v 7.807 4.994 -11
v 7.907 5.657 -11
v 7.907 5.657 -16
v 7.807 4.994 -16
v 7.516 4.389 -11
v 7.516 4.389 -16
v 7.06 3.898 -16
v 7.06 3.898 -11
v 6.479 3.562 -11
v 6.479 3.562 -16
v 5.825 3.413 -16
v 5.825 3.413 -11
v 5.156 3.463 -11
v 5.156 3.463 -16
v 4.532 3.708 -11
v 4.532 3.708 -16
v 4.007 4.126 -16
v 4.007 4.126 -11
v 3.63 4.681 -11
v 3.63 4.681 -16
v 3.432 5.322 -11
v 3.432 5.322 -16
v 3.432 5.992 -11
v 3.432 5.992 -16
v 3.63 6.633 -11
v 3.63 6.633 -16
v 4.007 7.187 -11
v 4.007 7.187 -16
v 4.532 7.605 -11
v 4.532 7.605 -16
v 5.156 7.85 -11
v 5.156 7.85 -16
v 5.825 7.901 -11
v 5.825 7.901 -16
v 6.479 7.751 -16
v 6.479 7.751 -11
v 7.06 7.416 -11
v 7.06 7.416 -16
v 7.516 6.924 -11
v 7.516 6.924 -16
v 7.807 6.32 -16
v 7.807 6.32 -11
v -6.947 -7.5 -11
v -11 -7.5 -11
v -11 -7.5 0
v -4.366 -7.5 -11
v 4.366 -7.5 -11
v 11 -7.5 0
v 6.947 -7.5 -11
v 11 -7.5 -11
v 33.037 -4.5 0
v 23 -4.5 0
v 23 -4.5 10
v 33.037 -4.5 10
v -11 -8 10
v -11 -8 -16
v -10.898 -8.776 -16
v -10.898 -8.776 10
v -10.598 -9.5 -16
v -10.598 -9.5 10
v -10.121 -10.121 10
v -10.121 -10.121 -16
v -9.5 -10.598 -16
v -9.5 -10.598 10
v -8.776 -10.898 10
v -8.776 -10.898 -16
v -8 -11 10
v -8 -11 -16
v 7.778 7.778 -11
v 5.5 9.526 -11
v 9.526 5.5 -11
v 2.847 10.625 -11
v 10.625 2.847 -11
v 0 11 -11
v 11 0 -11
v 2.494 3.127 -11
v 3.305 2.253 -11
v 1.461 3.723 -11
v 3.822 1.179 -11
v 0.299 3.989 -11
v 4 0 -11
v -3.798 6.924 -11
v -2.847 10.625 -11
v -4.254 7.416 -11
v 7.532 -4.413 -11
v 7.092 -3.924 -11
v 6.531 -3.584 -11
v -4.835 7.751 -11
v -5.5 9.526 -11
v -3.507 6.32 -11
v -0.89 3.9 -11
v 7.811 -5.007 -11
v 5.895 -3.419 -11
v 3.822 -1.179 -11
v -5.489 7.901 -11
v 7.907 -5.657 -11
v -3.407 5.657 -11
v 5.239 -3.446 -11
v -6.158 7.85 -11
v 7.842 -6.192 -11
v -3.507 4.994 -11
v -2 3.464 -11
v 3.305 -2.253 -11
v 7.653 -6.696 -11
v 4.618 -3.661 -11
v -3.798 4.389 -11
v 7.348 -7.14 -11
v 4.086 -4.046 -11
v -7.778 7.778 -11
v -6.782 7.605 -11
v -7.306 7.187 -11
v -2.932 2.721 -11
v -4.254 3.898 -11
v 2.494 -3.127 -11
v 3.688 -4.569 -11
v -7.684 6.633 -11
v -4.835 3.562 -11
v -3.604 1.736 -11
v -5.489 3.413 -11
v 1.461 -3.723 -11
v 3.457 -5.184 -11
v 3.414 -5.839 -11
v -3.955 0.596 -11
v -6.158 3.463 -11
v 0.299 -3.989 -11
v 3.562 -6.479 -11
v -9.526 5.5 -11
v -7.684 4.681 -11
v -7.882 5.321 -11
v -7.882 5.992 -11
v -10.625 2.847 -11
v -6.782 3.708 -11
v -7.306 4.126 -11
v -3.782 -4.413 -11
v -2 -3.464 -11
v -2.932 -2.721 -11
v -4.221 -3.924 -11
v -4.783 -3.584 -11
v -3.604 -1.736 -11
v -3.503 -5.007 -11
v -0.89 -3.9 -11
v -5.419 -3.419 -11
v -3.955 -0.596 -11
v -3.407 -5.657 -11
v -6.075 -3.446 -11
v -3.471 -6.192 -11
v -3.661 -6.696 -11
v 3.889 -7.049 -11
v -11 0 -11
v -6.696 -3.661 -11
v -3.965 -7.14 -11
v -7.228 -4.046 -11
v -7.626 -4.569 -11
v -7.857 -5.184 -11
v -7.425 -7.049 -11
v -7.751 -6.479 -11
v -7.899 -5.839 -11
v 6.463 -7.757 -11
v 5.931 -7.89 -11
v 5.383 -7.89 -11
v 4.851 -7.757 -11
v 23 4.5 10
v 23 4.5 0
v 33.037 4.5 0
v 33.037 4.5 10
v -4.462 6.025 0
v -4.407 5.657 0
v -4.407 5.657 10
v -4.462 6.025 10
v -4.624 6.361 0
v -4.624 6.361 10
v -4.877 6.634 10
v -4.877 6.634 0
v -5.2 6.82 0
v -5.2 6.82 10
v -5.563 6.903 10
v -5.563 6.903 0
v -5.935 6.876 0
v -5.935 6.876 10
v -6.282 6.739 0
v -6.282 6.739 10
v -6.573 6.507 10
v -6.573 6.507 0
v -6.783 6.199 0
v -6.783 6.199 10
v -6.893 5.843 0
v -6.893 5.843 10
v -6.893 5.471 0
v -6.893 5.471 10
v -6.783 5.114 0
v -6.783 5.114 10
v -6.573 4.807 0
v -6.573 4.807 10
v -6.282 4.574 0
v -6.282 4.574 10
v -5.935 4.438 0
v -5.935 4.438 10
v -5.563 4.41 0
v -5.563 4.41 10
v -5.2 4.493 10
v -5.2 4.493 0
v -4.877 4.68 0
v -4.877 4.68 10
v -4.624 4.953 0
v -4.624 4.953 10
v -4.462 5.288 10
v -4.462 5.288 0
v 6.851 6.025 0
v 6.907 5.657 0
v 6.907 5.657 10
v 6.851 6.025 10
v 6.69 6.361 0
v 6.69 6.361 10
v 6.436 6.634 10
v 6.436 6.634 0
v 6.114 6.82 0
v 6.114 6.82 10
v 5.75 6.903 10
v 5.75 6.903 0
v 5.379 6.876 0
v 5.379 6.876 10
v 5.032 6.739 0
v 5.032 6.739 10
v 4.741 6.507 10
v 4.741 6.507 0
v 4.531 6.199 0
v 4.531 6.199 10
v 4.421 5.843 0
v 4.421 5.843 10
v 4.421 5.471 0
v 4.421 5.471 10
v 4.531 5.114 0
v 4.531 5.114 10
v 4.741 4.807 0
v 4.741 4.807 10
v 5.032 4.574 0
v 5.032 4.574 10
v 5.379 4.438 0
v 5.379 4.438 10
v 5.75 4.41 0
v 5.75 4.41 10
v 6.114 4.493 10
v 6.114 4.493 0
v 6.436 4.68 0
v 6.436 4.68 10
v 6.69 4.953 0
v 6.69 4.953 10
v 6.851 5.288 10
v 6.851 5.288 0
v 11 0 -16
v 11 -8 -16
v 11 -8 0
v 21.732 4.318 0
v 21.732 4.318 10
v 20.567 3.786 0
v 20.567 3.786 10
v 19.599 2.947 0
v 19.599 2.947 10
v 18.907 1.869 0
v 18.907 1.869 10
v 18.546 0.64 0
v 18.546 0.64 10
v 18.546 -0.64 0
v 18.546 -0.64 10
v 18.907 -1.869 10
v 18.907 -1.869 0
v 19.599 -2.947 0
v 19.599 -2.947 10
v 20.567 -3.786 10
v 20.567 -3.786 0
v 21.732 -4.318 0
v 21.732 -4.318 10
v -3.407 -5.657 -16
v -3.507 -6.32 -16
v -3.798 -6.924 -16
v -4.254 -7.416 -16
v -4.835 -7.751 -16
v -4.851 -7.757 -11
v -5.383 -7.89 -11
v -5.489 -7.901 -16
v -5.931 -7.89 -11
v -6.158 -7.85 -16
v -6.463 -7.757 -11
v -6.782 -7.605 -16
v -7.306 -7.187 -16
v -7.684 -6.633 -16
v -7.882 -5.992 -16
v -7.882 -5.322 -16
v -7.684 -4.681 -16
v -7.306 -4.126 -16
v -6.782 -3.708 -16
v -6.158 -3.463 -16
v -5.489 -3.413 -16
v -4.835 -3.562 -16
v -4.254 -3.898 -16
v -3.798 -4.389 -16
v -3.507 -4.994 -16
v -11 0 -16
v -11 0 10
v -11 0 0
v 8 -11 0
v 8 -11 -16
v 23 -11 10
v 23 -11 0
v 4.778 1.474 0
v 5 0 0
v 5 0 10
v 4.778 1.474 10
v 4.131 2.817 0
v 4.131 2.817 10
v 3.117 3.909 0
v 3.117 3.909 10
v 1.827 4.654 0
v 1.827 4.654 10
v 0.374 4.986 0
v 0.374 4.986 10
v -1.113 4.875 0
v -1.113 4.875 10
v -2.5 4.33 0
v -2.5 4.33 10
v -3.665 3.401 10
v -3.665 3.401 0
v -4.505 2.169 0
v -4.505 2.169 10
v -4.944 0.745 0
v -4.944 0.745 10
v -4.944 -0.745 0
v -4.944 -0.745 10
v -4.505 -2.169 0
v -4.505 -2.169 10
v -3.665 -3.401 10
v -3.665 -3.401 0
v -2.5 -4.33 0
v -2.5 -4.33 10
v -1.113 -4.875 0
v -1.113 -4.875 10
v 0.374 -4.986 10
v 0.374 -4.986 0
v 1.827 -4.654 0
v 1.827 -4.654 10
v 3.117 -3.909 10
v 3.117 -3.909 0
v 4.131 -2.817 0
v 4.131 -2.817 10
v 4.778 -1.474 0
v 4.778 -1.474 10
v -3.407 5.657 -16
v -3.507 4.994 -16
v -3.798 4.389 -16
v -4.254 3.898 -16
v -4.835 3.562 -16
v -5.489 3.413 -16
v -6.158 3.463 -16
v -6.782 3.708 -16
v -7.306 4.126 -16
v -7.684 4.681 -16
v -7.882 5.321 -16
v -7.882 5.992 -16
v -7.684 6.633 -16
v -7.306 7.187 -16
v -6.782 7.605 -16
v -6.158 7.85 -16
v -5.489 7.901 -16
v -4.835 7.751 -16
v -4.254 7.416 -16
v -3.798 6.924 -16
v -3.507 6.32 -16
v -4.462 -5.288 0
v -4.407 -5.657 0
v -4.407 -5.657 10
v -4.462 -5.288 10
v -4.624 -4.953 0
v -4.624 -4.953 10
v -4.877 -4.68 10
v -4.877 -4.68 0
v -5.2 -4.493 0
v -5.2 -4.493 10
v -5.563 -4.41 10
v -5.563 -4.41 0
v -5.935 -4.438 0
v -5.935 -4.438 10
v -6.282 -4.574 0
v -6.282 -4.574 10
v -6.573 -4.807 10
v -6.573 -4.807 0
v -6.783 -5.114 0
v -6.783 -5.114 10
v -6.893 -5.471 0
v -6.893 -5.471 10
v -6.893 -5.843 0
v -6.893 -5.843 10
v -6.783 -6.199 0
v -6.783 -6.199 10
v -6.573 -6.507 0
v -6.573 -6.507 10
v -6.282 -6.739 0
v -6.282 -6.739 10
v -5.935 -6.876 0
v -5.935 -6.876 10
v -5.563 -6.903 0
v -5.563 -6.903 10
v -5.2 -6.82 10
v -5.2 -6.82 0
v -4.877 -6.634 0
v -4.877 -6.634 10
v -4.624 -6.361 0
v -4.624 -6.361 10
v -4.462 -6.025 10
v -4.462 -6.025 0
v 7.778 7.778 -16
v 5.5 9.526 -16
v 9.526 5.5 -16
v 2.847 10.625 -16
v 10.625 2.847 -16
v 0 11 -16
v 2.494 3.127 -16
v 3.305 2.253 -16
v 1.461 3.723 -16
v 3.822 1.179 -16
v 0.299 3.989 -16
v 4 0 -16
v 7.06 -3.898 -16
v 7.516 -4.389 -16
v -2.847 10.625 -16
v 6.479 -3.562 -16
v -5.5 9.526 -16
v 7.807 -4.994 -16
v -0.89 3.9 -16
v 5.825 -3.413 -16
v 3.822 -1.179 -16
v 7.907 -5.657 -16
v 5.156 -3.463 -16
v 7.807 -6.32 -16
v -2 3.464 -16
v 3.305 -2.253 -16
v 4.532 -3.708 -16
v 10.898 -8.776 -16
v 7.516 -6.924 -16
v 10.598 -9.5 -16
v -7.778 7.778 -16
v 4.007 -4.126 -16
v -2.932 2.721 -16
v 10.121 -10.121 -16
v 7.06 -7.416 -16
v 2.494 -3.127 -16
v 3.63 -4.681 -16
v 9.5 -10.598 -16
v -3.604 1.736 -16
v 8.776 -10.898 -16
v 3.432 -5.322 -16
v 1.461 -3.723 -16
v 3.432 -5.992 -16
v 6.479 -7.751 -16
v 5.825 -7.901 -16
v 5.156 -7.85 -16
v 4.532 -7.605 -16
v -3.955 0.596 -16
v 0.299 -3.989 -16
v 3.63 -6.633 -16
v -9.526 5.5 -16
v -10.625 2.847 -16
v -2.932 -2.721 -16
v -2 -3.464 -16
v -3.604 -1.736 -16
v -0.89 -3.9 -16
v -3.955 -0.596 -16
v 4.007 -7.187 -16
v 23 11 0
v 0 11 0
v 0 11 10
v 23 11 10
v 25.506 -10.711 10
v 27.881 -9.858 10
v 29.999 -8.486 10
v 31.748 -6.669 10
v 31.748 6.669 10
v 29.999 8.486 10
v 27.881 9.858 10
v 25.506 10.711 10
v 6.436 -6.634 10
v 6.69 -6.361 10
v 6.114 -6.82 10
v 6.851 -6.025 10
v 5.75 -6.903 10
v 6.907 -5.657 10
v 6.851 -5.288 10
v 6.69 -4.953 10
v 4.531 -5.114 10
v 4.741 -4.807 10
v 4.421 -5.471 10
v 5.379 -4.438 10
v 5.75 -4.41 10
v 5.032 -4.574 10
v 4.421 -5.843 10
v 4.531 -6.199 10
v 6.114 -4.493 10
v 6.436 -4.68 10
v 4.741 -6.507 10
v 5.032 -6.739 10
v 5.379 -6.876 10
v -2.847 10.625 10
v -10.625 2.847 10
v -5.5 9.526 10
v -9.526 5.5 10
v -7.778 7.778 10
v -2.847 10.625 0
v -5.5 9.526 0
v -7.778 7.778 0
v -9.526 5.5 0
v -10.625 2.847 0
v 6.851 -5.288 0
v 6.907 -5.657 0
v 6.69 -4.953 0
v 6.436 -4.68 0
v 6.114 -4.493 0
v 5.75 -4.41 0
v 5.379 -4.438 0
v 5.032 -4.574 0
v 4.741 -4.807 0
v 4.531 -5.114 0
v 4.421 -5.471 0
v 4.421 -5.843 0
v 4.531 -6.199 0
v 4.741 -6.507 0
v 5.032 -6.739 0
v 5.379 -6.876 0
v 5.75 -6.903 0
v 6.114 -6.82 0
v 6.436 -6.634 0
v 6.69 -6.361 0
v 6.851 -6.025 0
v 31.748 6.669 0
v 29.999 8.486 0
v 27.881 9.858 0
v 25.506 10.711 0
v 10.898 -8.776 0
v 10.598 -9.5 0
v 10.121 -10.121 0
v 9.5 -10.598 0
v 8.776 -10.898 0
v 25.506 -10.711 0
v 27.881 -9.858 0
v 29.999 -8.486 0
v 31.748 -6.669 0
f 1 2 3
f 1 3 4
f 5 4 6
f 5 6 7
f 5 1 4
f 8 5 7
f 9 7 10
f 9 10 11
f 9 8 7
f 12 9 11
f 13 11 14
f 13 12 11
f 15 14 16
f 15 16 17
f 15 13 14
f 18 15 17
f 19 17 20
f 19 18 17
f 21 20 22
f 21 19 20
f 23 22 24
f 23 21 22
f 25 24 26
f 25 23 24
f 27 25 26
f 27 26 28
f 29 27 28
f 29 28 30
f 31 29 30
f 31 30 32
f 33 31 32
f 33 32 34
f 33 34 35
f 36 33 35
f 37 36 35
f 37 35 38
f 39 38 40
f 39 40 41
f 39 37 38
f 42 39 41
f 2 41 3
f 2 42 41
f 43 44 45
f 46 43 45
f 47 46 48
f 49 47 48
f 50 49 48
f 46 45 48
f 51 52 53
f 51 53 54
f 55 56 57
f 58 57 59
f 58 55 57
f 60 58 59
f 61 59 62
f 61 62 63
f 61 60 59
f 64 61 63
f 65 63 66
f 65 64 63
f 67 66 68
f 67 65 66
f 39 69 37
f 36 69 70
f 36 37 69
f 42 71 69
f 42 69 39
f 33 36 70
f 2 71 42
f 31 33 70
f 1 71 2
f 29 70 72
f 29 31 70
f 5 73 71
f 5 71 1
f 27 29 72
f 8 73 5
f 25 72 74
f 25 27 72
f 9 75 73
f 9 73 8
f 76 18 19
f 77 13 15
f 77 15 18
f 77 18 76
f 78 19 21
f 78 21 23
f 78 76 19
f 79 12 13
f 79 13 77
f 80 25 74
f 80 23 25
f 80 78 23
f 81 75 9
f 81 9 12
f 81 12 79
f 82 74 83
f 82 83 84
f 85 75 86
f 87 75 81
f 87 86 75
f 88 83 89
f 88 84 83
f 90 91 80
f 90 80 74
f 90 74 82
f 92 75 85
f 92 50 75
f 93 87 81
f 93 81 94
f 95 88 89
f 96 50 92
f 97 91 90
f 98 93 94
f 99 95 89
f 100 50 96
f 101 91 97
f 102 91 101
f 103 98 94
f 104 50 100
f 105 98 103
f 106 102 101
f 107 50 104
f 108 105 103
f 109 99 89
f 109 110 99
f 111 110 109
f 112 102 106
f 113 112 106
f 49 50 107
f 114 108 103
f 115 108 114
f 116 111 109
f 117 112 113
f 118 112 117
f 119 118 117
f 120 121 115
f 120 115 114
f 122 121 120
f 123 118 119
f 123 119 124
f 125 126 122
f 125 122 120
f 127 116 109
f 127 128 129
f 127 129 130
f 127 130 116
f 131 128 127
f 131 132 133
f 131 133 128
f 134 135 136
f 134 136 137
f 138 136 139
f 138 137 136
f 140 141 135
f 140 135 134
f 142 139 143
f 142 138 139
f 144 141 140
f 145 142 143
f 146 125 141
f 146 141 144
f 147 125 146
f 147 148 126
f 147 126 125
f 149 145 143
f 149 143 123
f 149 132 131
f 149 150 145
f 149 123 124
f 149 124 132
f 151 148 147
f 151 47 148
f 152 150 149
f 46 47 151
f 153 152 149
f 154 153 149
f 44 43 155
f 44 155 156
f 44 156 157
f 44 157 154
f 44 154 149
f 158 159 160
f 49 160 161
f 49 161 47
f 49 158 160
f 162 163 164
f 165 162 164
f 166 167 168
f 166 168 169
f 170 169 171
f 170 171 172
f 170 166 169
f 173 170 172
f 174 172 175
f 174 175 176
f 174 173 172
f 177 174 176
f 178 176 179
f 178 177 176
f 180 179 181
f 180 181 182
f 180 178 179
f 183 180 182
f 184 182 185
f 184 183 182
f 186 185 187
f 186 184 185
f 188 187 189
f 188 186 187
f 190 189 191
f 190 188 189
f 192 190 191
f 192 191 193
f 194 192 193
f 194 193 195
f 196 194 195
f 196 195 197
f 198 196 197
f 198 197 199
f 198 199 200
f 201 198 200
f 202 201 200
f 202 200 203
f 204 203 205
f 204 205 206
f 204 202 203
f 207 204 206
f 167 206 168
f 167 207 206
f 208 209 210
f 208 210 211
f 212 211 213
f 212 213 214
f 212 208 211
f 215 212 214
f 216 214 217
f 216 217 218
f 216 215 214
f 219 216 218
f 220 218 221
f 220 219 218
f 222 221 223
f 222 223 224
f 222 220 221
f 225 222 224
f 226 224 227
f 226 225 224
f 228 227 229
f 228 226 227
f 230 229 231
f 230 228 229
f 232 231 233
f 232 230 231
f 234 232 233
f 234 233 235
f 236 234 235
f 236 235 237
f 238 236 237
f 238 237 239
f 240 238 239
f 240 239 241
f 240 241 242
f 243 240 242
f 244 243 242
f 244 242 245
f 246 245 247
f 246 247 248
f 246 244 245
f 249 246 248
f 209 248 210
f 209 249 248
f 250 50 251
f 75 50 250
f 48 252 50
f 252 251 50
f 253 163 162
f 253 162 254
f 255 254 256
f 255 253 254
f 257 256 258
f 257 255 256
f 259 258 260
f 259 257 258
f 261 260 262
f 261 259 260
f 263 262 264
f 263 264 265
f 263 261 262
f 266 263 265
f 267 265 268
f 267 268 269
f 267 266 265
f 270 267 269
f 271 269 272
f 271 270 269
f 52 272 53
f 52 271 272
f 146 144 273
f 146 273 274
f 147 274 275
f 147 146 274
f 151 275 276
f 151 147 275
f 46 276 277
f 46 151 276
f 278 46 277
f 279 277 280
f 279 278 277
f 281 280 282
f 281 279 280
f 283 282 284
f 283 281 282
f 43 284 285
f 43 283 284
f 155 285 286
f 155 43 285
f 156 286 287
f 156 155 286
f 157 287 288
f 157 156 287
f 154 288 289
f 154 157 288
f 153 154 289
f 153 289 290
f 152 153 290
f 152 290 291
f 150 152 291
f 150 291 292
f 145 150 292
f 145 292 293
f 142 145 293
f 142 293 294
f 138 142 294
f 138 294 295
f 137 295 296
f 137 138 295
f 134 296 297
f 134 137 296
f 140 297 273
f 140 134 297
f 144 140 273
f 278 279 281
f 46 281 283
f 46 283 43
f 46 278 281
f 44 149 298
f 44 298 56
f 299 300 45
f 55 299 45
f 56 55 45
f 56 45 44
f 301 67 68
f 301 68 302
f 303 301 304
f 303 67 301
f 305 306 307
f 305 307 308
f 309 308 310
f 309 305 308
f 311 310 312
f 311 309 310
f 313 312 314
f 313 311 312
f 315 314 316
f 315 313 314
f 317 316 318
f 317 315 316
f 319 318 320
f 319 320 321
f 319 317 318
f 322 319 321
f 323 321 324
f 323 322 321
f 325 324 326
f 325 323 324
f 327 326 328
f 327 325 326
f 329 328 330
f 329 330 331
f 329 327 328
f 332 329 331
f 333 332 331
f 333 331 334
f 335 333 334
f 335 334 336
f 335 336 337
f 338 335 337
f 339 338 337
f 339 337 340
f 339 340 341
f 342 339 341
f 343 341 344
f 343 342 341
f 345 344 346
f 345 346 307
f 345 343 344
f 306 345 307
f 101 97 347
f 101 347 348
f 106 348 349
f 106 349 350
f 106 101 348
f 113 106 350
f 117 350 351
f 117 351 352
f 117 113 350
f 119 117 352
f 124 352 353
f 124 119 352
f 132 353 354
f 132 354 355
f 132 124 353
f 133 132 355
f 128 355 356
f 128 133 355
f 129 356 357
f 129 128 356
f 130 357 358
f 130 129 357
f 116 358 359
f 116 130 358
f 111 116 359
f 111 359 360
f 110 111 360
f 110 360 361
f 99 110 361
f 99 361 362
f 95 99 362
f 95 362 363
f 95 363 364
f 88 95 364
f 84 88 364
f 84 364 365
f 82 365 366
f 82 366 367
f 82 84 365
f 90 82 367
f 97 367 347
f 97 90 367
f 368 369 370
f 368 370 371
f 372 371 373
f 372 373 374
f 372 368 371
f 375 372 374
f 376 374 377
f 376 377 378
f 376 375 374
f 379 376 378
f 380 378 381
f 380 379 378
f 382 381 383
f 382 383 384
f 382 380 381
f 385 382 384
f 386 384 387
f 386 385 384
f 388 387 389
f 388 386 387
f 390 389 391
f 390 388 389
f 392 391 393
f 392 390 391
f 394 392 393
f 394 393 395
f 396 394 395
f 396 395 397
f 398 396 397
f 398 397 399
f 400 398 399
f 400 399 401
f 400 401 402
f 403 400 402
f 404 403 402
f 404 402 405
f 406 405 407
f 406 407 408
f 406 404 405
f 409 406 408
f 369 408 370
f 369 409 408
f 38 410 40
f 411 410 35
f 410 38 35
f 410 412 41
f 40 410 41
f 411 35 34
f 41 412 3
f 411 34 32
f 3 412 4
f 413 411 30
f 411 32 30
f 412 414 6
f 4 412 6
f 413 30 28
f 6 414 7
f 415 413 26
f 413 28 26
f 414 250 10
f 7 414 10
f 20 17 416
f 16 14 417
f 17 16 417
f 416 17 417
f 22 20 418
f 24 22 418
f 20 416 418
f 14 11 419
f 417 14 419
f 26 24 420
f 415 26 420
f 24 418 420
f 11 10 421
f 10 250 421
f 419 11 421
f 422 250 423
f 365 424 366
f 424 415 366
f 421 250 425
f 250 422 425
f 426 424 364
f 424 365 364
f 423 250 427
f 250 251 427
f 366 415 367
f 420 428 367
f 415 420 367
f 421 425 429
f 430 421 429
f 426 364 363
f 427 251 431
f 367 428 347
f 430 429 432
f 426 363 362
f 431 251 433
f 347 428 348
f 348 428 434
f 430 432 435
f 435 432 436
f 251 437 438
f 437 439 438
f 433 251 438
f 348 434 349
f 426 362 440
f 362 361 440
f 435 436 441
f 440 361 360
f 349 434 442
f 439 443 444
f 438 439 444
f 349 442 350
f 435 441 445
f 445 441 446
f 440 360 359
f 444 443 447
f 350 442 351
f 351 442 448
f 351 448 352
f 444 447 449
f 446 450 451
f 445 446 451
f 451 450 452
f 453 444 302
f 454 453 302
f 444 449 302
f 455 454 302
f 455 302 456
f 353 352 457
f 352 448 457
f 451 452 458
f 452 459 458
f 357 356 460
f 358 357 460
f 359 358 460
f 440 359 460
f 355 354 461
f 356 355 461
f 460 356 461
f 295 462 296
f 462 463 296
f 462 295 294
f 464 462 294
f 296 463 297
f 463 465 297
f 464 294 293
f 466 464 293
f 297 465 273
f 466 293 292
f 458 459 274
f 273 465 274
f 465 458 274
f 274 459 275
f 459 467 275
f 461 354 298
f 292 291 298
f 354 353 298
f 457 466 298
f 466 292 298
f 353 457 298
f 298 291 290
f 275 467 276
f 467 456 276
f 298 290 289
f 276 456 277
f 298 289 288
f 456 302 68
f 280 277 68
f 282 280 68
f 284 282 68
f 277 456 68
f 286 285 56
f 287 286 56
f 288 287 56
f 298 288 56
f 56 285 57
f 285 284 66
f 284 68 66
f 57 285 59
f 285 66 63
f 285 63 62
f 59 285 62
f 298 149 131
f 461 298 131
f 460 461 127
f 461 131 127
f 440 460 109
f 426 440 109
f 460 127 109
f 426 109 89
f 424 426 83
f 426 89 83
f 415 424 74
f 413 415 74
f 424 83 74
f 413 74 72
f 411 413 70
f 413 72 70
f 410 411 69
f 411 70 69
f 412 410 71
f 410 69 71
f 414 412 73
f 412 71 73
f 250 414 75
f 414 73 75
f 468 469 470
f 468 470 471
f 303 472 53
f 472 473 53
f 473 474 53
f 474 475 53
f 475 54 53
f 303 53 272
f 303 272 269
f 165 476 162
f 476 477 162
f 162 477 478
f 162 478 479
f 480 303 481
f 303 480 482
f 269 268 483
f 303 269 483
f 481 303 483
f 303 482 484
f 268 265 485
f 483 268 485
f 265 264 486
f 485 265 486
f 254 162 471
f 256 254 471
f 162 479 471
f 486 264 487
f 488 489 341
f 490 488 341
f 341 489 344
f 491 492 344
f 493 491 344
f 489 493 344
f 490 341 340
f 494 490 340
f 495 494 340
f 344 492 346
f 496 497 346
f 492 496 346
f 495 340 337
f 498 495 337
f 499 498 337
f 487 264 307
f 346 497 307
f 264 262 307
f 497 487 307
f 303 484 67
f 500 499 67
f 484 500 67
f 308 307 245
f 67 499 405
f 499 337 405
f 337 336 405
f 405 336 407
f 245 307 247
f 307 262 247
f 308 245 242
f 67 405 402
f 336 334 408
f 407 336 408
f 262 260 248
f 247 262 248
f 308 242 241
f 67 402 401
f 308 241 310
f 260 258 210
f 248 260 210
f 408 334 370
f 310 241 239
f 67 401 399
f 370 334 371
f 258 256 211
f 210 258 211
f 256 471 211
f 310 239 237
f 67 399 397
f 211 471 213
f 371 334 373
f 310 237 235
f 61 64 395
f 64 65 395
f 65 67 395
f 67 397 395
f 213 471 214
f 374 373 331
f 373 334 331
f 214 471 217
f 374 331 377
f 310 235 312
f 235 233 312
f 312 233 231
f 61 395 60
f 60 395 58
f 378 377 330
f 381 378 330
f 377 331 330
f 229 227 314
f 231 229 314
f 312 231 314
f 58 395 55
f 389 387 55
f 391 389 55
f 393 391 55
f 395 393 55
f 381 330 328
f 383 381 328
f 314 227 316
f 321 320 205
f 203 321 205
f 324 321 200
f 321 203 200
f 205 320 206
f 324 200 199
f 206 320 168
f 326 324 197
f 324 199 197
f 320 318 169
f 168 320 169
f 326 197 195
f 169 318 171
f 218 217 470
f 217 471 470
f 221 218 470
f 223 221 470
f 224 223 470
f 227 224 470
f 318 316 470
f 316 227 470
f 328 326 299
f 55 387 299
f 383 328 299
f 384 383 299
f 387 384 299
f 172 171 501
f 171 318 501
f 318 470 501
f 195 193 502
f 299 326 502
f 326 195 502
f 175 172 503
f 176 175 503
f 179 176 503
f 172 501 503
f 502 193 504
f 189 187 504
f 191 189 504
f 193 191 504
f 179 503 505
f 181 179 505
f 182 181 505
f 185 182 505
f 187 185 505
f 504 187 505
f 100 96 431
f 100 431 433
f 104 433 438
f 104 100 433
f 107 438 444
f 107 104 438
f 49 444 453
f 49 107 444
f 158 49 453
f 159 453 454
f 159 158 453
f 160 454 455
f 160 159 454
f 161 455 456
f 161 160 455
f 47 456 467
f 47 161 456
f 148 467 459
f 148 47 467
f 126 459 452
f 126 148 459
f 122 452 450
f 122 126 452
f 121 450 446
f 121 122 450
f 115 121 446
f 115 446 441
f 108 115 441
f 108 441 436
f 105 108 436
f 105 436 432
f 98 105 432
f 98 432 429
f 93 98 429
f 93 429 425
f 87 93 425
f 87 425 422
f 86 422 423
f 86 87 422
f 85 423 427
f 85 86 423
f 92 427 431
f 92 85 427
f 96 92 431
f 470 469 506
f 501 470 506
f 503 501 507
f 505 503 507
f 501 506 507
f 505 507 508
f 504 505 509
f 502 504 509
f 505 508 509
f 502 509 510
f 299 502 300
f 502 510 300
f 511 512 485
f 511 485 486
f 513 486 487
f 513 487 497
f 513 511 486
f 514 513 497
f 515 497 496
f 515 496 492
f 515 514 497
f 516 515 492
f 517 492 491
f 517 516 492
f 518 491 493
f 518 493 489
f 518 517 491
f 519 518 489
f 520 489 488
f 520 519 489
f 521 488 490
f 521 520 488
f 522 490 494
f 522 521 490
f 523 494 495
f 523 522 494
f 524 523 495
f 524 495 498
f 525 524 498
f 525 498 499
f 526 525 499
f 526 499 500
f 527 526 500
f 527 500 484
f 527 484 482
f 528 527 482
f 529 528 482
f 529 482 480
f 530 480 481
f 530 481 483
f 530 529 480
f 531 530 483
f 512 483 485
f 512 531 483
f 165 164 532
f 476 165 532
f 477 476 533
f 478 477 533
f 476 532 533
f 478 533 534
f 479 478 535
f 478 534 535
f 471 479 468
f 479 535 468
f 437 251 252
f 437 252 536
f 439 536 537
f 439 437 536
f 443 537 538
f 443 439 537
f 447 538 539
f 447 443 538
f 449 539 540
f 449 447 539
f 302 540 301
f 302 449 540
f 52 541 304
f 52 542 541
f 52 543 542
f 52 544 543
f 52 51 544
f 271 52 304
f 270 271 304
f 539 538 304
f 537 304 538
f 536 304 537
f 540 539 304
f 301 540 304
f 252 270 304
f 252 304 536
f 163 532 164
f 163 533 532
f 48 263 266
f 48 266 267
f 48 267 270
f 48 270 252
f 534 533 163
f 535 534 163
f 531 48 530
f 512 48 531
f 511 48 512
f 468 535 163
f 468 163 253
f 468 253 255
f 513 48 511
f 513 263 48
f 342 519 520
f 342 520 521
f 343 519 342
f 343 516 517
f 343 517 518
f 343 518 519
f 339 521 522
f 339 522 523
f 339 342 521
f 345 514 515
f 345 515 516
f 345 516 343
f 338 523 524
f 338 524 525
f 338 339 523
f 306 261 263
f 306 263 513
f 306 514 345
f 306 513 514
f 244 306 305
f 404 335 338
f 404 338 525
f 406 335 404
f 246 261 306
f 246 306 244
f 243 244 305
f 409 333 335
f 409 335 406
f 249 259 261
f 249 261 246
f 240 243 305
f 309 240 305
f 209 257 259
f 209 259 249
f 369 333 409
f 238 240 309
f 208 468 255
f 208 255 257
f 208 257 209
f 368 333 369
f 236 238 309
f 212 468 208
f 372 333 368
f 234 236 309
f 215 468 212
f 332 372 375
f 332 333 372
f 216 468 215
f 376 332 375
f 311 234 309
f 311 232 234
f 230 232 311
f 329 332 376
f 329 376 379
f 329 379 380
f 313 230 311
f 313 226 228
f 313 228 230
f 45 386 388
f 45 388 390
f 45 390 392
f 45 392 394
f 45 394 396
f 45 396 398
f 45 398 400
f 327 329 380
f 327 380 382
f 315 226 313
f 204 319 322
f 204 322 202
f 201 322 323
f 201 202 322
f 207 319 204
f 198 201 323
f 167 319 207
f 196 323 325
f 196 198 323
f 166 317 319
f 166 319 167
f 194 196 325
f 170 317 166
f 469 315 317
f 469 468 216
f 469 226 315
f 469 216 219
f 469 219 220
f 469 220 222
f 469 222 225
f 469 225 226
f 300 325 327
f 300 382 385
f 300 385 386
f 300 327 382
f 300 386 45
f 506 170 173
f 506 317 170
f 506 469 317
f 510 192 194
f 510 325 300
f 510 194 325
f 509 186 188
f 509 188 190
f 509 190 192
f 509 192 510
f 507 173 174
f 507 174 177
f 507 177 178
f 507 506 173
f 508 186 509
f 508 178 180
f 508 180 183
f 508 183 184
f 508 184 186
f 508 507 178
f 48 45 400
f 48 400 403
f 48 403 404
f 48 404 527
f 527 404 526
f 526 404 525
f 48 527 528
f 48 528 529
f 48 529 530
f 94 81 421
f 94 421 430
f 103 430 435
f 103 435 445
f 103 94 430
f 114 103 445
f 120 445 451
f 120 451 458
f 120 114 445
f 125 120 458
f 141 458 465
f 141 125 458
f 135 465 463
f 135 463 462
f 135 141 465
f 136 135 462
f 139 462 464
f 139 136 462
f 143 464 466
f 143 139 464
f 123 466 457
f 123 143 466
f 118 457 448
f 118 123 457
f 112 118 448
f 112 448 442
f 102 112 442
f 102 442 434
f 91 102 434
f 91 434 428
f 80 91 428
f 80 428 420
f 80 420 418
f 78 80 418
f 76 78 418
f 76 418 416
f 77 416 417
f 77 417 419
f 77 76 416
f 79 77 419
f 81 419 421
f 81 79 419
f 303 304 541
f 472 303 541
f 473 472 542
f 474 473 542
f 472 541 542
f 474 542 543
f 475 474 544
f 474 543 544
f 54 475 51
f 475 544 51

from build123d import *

# Parameters (mm, degrees)
SKETCH_R        = 5
SKETCH_R_2      = 1.25
PAD_DEPTH       = 10
SKETCH002_W     = 22
SKETCH002_H     = 3.5
PAD001_DEPTH    = 11
SKETCH003_R     = 4
SKETCH003_R_2   = 2.25
PAD002_DEPTH    = 5
POCKET_DEPTH    = 26.001
POCKET001_DEPTH = 16


with BuildPart() as part:
    # Sketch → Pad (new body)
    with BuildSketch(Plane.XY):
        with BuildLine():
            Line((0, 11), (23, 11))
            ThreePointArc((33.03743, 4.5), (28.97913, 9.233093), (23, 11))
            Line((23, 4.5), (33.03743, 4.5))
            ThreePointArc((23, 4.5), (18.5, 0), (23, -4.5))
            Line((23, -4.5), (33.03743, -4.5))
            ThreePointArc((23, -11), (28.97913, -9.233093), (33.03743, -4.5))
            Line((23, -11), (0, -11))
            Line((-11, -11), (0, -11))
            Line((-11, -11), (-11, 0))
            ThreePointArc((0, 11), (-7.778175, 7.778175), (-11, 0))
        make_face()
        Circle(SKETCH_R, mode=Mode.SUBTRACT)
        with Locations((-5.656854, 5.656854)):
            Circle(SKETCH_R_2, mode=Mode.SUBTRACT)
        with Locations((5.656854, 5.656854)):
            Circle(SKETCH_R_2, mode=Mode.SUBTRACT)
        with Locations((5.656854, -5.656854)):
            Circle(SKETCH_R_2, mode=Mode.SUBTRACT)
        with Locations((-5.656854, -5.656854)):
            Circle(SKETCH_R_2, mode=Mode.SUBTRACT)
    extrude(amount=PAD_DEPTH)

    # Sketch002 (on Face16 of Pad) → Pad001 (join)
    with BuildSketch(Plane(origin=(0, 0, 0), x_dir=(1, 0, 0), z_dir=(0, 0, -1))):
        with Locations((0, 9.25)):
            Rectangle(SKETCH002_W, SKETCH002_H)
    extrude(amount=PAD001_DEPTH)

    # Sketch003 (on Face11 of Pad001) → Pad002 (join)
    with BuildSketch(Plane(origin=(0, 0, -11), x_dir=(1, 0, 0), z_dir=(0, 0, -1))):
        with BuildLine():
            Line((-11, 0), (-11, 11))
            Line((-11, 11), (11, 11))
            Line((11, 11), (11, 0))
            ThreePointArc((-11, 0), (0, -11), (11, 0))
        make_face()
        Circle(SKETCH003_R, mode=Mode.SUBTRACT)
        with Locations((-5.656849, 5.65686)):
            Circle(SKETCH003_R_2, mode=Mode.SUBTRACT)
        with Locations((5.656849, 5.65686)):
            Circle(SKETCH003_R_2, mode=Mode.SUBTRACT)
        with Locations((5.656849, -5.65686)):
            Circle(SKETCH003_R_2, mode=Mode.SUBTRACT)
        with Locations((-5.656871, -5.656837)):
            Circle(SKETCH003_R_2, mode=Mode.SUBTRACT)
    extrude(amount=PAD002_DEPTH)

    # Sketch005 (on Face6 of Pad002) → Pocket (cut, through all)
    with BuildSketch(Plane.XY.offset(10)):
        with BuildLine():
            Line((-11, -11), (-11, -8))
            ThreePointArc((-11, -8), (-10.12132, -10.12132), (-8, -11))
            Line((-11, -11), (-8, -11))
        make_face()
    extrude(amount=-POCKET_DEPTH, mode=Mode.SUBTRACT)

    # Sketch006 (on Face25 of Pocket) → Pocket001 (cut)
    with BuildSketch(Plane(origin=(0, 0, -16), x_dir=(1, 0, 0), z_dir=(0, 0, -1))):
        with BuildLine():
            Line((8, 11), (11, 11))
            Line((11, 11), (11, 8))
            ThreePointArc((11, 8), (10.12132, 10.12132), (8, 11))
        make_face()
    extrude(amount=-POCKET001_DEPTH, mode=Mode.SUBTRACT)


solid = part.part
